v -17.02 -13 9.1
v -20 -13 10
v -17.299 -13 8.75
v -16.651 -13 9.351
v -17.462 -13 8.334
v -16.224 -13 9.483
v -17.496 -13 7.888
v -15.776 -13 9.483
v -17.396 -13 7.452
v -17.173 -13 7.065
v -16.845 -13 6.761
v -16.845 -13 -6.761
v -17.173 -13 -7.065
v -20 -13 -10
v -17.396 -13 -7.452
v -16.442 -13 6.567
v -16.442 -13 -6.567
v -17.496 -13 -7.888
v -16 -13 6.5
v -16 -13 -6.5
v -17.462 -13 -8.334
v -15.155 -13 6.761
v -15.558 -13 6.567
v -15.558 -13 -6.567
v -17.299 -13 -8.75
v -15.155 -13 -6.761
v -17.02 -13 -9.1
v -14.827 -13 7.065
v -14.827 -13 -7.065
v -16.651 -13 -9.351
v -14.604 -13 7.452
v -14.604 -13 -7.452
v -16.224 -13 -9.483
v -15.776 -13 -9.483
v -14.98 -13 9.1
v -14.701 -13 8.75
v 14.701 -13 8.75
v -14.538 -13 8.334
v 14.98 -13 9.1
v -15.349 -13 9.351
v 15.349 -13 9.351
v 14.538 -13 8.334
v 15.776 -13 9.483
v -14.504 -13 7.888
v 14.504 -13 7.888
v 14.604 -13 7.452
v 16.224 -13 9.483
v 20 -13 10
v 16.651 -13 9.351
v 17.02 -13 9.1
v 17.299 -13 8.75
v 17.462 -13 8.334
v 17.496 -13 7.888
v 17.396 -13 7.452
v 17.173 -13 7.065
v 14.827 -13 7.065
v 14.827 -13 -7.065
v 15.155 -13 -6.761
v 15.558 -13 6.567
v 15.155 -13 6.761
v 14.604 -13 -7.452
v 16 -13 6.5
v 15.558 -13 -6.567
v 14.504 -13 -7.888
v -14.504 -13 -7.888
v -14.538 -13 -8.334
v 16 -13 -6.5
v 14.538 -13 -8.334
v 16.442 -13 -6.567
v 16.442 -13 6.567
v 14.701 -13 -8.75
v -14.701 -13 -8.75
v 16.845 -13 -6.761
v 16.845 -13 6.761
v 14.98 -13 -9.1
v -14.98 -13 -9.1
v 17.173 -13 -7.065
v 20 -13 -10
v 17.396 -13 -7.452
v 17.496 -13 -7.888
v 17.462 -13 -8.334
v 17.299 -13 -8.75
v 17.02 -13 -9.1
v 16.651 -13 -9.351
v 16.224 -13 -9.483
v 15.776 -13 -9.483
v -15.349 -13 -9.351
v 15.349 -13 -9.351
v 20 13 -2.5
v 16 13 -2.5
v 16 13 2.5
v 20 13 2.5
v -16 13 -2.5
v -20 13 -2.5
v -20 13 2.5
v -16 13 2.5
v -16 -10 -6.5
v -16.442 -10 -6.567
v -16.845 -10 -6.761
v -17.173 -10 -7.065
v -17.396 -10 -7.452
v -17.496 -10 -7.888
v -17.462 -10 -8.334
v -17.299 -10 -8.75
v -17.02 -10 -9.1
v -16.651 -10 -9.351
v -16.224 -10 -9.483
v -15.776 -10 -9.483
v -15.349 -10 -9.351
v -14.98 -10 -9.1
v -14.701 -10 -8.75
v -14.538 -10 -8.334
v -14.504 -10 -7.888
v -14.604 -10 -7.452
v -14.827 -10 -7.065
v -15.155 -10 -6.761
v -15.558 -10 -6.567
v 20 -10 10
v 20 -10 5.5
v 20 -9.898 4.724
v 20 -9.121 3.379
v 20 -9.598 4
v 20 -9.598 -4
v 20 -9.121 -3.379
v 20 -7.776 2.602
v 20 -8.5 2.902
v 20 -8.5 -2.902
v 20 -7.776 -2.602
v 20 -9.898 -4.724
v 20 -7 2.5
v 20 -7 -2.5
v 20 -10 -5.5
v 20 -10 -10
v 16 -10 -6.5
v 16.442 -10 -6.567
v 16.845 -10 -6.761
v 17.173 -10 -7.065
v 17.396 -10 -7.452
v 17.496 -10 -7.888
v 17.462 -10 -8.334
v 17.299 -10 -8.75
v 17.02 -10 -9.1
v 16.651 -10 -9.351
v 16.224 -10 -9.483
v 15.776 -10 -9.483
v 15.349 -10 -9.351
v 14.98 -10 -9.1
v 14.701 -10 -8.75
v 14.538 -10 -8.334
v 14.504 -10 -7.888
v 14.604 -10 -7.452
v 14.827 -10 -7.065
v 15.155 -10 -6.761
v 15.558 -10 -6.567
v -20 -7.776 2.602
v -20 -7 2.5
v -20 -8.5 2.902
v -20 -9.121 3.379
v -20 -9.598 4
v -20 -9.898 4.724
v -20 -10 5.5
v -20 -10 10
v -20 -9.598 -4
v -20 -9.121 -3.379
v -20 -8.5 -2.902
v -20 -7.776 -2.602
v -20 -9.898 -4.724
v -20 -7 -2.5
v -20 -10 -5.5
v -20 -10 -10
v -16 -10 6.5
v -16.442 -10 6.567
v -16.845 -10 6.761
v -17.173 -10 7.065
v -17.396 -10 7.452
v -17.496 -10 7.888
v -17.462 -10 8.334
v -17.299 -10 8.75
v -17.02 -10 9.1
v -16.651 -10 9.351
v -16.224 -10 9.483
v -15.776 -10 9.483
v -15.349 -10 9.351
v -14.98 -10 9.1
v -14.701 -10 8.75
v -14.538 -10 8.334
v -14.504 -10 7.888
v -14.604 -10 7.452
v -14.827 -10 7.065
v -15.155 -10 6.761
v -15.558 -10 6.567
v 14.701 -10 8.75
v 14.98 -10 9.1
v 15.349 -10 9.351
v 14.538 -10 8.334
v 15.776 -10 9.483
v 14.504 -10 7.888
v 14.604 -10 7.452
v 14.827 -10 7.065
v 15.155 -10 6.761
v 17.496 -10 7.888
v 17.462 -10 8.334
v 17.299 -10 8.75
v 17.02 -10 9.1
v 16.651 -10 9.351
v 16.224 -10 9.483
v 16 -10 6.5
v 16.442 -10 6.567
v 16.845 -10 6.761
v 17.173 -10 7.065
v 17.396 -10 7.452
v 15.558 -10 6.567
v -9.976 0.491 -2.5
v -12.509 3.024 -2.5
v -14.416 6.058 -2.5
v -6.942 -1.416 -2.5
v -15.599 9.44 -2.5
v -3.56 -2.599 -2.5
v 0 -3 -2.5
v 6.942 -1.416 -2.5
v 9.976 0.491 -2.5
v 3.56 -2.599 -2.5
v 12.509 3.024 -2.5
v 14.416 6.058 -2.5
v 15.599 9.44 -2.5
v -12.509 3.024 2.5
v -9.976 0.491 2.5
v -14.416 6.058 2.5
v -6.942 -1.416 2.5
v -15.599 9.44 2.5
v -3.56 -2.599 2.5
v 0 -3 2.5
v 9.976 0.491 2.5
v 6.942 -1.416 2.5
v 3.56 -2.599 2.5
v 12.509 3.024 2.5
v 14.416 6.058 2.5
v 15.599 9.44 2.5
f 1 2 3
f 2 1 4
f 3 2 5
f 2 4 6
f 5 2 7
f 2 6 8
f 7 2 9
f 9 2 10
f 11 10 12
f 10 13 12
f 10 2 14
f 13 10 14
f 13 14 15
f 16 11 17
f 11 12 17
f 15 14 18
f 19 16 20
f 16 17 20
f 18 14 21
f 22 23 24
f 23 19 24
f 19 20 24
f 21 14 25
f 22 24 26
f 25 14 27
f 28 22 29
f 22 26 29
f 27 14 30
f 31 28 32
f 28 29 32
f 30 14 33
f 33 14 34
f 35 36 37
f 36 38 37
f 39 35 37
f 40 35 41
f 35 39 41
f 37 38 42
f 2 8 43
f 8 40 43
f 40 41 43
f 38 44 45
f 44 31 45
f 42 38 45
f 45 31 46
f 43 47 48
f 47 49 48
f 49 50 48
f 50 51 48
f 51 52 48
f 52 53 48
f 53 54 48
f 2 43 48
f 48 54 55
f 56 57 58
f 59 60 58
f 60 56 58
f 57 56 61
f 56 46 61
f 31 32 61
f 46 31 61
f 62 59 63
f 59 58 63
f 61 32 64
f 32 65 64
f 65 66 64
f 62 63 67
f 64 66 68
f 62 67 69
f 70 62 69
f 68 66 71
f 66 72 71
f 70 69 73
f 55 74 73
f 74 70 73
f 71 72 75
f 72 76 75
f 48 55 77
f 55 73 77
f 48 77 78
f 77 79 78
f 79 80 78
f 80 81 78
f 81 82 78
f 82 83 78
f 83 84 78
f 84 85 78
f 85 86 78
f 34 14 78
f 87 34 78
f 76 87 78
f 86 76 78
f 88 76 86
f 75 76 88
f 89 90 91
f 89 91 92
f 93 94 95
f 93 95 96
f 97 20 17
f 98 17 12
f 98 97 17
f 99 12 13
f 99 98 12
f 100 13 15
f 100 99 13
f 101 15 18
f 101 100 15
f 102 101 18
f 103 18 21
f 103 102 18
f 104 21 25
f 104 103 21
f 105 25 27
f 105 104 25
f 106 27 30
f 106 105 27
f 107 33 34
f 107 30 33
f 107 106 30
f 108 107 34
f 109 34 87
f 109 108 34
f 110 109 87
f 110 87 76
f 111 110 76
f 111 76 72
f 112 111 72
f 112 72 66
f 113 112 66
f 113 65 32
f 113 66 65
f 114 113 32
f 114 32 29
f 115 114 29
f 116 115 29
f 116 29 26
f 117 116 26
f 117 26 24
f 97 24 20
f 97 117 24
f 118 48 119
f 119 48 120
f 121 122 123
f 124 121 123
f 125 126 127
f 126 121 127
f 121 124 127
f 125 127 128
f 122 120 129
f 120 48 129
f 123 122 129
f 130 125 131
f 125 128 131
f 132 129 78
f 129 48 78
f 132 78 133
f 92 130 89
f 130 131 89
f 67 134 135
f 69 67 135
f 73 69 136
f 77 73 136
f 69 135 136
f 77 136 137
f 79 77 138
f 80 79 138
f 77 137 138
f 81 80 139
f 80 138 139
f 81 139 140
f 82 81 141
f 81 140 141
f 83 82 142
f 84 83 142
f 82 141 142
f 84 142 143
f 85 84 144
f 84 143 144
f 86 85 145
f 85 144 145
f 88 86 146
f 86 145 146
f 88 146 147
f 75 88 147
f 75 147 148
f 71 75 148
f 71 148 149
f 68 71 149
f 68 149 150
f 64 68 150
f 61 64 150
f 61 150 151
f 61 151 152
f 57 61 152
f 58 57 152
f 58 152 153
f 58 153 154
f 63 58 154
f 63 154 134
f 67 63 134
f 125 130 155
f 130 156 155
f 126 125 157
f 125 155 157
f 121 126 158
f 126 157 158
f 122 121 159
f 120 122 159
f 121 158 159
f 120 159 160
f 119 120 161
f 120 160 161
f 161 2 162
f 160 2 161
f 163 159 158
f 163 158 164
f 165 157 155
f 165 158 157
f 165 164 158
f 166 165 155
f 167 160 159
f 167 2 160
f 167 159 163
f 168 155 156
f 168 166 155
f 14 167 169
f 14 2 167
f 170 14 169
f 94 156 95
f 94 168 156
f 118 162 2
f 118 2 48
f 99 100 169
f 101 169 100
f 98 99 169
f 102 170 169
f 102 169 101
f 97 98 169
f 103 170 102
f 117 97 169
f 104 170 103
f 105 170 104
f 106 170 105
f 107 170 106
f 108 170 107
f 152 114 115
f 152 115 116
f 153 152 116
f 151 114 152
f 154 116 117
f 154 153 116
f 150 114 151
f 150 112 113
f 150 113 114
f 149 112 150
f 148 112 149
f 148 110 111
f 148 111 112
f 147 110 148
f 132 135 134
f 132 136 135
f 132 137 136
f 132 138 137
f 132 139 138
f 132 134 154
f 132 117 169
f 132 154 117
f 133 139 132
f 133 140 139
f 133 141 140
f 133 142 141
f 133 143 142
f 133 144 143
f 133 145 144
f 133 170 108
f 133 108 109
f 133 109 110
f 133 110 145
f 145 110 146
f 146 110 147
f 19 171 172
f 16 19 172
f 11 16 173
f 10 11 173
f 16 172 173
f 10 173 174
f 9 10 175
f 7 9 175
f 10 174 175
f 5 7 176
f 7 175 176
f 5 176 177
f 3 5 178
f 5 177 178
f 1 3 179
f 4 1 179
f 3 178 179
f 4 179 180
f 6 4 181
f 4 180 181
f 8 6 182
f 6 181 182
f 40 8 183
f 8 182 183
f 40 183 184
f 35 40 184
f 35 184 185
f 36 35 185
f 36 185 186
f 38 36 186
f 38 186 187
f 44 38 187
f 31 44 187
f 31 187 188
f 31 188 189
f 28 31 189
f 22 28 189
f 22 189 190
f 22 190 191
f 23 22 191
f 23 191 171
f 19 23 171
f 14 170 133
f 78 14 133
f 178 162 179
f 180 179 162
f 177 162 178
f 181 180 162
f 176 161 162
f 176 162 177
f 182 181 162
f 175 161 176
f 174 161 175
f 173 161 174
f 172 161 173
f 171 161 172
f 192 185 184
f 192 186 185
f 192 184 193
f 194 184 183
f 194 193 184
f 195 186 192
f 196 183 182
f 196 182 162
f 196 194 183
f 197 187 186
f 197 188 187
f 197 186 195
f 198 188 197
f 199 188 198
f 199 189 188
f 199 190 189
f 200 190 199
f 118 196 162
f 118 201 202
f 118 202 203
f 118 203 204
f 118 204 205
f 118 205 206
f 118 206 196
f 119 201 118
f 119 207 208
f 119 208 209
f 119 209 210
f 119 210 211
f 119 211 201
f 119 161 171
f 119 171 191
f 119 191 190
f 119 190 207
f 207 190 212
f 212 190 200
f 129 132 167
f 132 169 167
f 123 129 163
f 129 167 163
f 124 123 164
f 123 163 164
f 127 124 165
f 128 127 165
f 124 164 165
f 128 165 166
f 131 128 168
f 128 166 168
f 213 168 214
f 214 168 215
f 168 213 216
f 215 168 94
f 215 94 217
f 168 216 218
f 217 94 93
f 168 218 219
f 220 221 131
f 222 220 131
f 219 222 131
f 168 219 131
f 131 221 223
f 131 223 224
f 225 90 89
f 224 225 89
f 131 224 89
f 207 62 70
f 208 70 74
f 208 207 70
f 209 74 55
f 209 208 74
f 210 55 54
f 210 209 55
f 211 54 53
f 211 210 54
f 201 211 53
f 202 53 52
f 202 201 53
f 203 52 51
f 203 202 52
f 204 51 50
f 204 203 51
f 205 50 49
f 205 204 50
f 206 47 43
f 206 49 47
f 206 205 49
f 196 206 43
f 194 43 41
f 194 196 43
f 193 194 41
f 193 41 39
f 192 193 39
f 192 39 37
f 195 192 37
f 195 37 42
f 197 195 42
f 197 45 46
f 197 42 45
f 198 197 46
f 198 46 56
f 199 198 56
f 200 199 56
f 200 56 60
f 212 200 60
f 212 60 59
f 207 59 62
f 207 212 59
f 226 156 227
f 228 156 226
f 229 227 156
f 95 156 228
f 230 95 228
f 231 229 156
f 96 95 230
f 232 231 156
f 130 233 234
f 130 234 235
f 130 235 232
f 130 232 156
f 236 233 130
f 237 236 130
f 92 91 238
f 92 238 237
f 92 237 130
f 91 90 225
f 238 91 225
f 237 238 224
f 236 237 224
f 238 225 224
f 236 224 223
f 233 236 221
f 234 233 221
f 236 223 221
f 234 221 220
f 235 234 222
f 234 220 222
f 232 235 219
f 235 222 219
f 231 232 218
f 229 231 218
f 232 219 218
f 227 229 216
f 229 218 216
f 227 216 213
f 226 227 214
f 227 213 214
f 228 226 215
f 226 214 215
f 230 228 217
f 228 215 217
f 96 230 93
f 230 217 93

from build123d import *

# Parameters (mm, degrees)
BOSS_EXTRUDE1_DEPTH      = 2.5
BOSS_EXTRUDE1_DEPTH_BACK = 2.5
SKETCH1_W                = 40
SKETCH1_H                = 26
SKETCH2_R                = 16
CUT_EXTRUDE1_DEPTH       = 25.372115214
BOSS_EXTRUDE2_DEPTH      = 10
BOSS_EXTRUDE2_DEPTH_BACK = 10
SKETCH3_W                = 40
SKETCH3_H                = 3
FILLET1_R                = 3
SKETCH4_R                = 1.5
CUT_EXTRUDE2_DEPTH       = 33.078029865
MIRROR2_COPY_1_SKETCH_R  = 1.5
MIRROR2_COPY_1_DEPTH     = 33.078029865


with BuildPart() as part:
    # Sketch1 → Boss-Extrude1 (new, two sides: drawn at the far end of the back side and taken through both)
    with BuildSketch(Plane.XY.offset(-BOSS_EXTRUDE1_DEPTH_BACK)):
        Rectangle(SKETCH1_W, SKETCH1_H)
    extrude(amount=BOSS_EXTRUDE1_DEPTH + BOSS_EXTRUDE1_DEPTH_BACK)

    # Sketch2 → Cut-Extrude1 (cut, through all)
    with BuildSketch(Plane(origin=(0, 0, -2.5), x_dir=(-1, 0, 0), z_dir=(0, 0, -1))):
        with Locations((0, 13)):
            Circle(SKETCH2_R)
    extrude(amount=-CUT_EXTRUDE1_DEPTH, mode=Mode.SUBTRACT)

    # Sketch3 → Boss-Extrude2 (add, two sides: drawn at the far end of the back side and taken through both)
    with BuildSketch(Plane.XY.offset(-BOSS_EXTRUDE2_DEPTH_BACK)):
        with Locations((0, -11.5)):
            Rectangle(SKETCH3_W, SKETCH3_H)
    extrude(amount=BOSS_EXTRUDE2_DEPTH + BOSS_EXTRUDE2_DEPTH_BACK)

    # Fillet1
    fillet1_edges = [part.edges().sort_by_distance(p)[0] for p in [
        (0, -10, -2.5),
        (0, -10, 2.5),
    ]]
    fillet(fillet1_edges, radius=FILLET1_R)

    # Sketch4 → Cut-Extrude2 (cut, through all)
    with BuildSketch(Plane(origin=(0, -10, 0), x_dir=(1, 0, 0), z_dir=(0, 1, 0))):
        with Locations((16, 8)):
            Circle(SKETCH4_R)
    cut_extrude2 = extrude(amount=-CUT_EXTRUDE2_DEPTH, mode=Mode.SUBTRACT)

    # Mirror1: Cut-Extrude2 across plane
    add(cut_extrude2.mirror(Plane.XY), mode=Mode.SUBTRACT)

    # Mirror2: Cut-Extrude2 across plane
    add(cut_extrude2.mirror(Plane(origin=(0, 0, 0), x_dir=(0, 0, 1), z_dir=(1, 0, 0))), mode=Mode.SUBTRACT)

    # Mirror2 copy 1 sketch → Mirror2 copy 1 (cut, through all)
    with BuildSketch(Plane(origin=(0, -10, 0), x_dir=(-1, 0, 0), z_dir=(0, 1, 0))):
        with Locations((16, 8)):
            Circle(MIRROR2_COPY_1_SKETCH_R)
    extrude(amount=-MIRROR2_COPY_1_DEPTH, mode=Mode.SUBTRACT)


solid = part.part
